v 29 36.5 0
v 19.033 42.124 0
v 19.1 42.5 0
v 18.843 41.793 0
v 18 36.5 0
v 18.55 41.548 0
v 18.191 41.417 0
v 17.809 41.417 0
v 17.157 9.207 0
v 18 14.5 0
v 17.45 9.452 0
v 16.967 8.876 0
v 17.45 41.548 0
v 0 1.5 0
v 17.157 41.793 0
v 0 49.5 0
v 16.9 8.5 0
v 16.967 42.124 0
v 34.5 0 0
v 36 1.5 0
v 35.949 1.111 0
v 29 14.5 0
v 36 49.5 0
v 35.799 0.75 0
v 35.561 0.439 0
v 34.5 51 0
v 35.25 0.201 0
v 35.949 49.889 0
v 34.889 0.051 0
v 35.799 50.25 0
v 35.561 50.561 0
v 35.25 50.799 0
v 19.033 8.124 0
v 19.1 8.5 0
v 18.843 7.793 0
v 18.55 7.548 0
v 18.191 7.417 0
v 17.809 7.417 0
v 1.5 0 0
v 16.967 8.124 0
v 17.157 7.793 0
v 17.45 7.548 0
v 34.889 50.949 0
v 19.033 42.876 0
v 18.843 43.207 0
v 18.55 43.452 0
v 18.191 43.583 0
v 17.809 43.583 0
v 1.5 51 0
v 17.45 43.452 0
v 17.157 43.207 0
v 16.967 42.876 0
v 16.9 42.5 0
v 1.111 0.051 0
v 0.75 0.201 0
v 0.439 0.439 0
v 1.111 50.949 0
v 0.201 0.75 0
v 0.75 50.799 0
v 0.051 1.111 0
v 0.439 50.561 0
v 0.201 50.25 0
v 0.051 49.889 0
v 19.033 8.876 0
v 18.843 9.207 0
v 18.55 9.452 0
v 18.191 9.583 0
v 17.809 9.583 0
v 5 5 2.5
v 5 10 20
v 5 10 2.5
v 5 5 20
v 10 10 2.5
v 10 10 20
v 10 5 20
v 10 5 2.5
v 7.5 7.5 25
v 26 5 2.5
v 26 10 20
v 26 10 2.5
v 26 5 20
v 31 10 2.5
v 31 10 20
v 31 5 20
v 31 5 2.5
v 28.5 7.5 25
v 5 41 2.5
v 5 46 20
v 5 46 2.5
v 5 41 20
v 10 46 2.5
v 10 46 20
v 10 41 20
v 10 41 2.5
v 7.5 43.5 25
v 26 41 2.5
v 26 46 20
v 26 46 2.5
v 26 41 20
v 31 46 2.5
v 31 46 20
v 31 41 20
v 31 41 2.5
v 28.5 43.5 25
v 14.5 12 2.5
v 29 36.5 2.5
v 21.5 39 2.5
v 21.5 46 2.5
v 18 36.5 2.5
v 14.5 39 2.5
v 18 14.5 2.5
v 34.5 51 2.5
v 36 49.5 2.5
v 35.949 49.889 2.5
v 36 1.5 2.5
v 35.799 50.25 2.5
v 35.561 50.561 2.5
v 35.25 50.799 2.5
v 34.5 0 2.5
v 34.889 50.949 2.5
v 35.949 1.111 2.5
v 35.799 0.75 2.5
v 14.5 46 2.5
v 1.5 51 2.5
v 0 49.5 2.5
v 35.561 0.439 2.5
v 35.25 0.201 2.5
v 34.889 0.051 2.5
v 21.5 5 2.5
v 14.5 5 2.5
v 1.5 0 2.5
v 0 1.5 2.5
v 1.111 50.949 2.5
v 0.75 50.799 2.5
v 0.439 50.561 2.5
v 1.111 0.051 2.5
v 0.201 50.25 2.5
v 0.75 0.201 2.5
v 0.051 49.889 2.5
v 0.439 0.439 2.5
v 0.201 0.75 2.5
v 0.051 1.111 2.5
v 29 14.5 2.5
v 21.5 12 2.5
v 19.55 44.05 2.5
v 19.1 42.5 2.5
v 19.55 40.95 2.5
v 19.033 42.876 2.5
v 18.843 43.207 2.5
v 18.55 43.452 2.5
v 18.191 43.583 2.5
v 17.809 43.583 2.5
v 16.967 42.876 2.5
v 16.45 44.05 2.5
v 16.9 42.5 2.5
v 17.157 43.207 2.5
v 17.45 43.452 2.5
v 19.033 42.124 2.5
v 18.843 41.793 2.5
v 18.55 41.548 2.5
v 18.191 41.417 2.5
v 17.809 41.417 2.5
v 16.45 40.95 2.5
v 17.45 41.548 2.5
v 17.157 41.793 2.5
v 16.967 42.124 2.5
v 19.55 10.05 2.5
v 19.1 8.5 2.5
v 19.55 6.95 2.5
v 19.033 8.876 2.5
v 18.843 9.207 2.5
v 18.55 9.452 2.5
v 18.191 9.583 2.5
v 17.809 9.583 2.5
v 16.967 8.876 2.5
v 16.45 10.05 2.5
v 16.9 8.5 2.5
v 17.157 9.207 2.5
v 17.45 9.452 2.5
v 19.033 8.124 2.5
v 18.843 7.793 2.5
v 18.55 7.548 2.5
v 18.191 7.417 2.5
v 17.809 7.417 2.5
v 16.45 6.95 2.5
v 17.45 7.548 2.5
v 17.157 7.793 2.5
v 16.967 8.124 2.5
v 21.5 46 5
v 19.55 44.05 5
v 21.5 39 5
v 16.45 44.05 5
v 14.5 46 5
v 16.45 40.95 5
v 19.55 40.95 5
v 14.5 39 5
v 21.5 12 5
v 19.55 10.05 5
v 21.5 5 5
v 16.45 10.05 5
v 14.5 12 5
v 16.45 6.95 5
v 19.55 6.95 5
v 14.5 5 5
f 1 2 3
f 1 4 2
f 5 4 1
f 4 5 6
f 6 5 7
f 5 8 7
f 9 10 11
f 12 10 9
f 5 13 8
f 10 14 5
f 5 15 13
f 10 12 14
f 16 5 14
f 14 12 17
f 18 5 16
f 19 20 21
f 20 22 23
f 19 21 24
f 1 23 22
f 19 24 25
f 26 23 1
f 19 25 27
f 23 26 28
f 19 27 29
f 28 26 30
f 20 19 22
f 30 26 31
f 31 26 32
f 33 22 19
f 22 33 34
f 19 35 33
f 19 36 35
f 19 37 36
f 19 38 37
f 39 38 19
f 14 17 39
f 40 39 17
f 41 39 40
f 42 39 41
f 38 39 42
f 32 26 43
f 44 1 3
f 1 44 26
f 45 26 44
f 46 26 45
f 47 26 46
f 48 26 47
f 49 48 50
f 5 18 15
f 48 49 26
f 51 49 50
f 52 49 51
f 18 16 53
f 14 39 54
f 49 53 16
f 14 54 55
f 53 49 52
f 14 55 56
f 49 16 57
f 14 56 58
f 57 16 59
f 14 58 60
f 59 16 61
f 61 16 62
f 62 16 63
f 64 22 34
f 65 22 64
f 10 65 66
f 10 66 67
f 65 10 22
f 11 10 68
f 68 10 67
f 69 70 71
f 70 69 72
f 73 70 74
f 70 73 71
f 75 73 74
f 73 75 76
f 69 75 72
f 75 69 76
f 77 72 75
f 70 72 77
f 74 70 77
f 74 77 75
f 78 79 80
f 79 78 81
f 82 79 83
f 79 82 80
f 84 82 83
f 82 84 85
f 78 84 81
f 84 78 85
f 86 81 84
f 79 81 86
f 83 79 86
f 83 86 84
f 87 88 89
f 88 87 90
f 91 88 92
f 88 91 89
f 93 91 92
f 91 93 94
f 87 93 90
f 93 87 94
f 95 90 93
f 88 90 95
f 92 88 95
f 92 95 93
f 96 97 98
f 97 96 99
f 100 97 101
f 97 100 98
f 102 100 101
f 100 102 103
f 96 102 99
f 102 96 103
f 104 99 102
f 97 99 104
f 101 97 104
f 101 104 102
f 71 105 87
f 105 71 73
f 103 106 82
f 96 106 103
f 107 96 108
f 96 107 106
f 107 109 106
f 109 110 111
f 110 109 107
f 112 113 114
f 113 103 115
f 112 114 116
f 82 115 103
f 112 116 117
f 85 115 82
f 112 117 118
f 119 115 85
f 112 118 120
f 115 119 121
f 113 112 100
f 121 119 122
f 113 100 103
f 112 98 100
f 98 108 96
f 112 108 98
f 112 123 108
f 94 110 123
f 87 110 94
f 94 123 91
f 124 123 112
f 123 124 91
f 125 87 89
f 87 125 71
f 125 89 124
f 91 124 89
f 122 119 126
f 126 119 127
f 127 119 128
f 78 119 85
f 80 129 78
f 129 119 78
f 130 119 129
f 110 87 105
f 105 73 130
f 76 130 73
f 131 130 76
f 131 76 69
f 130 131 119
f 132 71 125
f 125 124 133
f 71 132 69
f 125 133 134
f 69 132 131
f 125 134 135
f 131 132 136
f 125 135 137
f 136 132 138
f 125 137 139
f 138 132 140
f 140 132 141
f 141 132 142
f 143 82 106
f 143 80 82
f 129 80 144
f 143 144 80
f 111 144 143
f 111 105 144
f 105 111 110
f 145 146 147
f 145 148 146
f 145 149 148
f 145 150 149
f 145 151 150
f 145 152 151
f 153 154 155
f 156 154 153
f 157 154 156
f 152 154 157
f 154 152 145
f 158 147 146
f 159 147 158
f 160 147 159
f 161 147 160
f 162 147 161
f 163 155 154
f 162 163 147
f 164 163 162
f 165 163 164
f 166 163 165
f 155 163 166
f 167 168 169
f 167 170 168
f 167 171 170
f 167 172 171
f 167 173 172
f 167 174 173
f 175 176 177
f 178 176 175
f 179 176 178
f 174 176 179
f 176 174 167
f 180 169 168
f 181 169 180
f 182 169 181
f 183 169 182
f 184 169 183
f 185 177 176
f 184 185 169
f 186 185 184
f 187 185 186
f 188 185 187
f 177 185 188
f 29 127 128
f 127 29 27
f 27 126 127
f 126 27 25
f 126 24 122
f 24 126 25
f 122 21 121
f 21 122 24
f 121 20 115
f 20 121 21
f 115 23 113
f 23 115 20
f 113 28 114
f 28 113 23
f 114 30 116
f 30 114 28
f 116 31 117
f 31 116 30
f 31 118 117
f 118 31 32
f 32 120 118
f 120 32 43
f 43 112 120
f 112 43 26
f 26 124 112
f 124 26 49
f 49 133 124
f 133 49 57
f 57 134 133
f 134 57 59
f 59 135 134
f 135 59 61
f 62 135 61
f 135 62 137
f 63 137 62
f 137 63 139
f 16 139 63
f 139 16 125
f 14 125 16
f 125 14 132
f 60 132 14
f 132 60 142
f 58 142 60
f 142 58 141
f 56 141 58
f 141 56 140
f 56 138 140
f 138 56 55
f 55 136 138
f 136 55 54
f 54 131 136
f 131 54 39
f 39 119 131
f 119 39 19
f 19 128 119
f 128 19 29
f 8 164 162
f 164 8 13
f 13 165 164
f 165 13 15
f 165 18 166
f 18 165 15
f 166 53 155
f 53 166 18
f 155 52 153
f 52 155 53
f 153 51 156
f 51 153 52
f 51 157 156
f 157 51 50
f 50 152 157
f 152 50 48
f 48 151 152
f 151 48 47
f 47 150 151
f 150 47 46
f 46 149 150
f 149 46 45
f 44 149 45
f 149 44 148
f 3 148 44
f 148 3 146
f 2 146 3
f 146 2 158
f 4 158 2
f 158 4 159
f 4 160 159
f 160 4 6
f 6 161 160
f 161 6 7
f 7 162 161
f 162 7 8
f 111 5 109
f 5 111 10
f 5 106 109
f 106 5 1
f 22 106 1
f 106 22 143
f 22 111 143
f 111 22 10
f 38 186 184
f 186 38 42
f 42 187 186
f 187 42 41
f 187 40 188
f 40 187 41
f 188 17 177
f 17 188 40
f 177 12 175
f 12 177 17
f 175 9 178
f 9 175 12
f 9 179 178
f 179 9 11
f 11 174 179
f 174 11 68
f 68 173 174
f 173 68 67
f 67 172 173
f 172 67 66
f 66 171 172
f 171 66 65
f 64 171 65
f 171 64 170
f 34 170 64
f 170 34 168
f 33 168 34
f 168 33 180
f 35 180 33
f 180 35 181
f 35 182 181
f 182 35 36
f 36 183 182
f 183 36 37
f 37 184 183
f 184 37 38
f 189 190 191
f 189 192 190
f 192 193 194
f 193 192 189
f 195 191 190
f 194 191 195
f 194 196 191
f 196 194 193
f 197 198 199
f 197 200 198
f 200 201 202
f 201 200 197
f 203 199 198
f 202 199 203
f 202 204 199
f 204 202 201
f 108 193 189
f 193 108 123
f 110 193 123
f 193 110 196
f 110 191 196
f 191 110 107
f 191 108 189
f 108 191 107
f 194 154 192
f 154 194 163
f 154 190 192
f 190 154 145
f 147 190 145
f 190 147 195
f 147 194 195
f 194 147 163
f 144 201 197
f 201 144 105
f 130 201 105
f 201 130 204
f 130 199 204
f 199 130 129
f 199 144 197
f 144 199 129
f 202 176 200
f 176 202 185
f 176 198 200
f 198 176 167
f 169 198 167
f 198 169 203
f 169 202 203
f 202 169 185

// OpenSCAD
// file: thumb.scad
include <../library/config.scad>;
use <../library/lib.scad>;
legDepth = 20;
legThickness = 5;
legOffset = 5;
thumbClusterWidth = 51;
thumbClusterHeight = 36;

module thumb_clay_leg()
{
    union()
    {
        push(legDepth) square(legThickness, center = true);
        translate([ 0, 0, legDepth ]) linear_extrude(height = legThickness, scale = -10)
            square(legThickness, center = true);
    }
}
module thumb()
{
    union()
    {
        push(caseThikness) difference()
        {
            thumb_dxf();
            thumb_screw_holes_dxf();
        }
        push(caseThikness + screwBumpSize) thumb_screw_dxf();
        translate([ legOffset + legThickness / 2, legOffset + legThickness / 2, 0 ]) thumb_clay_leg();
        translate([ thumbClusterHeight - legOffset - legThickness / 2, legOffset + legThickness / 2, 0 ])
            thumb_clay_leg();

        translate([ legOffset + legThickness / 2, thumbClusterWidth - legOffset - legThickness / 2, 0 ])
            thumb_clay_leg();
        translate(
            [ thumbClusterHeight - legOffset - legThickness / 2, thumbClusterWidth - legOffset - legThickness / 2, 0 ])
            thumb_clay_leg();
    }
}
// file: ../library/lib.scad
include <./config.scad>;

// This function is limited to 11 elements!
function unshift(vec) = [ vec[1], vec[2], vec[3], vec[4], vec[5], vec[6], vec[7], vec[8], vec[9], vec[10], vec[11] ];

module showVector(vector)
// showVector(vector = [ 10, 10, 10 ]);
{
    start = [ 0, 0, 0 ];           // Starting point of the vector
    length = norm(vector - start); // Length of the vector
    x = vector[0];
    y = vector[1];
    z = vector[2];
    b = acos(z / length); // inclination angle
    c = atan2(y, x);      // azimuthal angle

    rotate([ 0, b, c ]) cylinder(h = length, r = 0.2);
    // % cube(vector); // corner of cube should coinciqde with end of cylin
}
// This function is limited to 11 elements!
function unshift(vec) = [ vec[1], vec[2], vec[3], vec[4], vec[5], vec[6], vec[7], vec[8], vec[9], vec[10], vec[11] ];

module showVector(vector)
// showVector(vector = [ 10, 10, 10 ]);
{
    start = [ 0, 0, 0 ];           // Starting point of the vector
    length = norm(vector - start); // Length of the vector
    x = vector[0];
    y = vector[1];
    z = vector[2];
    b = acos(z / length); // inclination angle
    c = atan2(y, x);      // azimuthal angle

    rotate([ 0, b, c ]) cylinder(h = length, r = 0.2);
    // % cube(vector); // corner of cube should coinciqde with end of cylin
}

// Allows to rotate a vector around the x, y and z axis while keeping original object rotation axis
// very usefull to rotate something around certain point in human readable format
// normal rotate() module stops being sane after second rotation
// i.e. rotate() rotate() rotate() will yield unexpected results if you are rotating for non 90 degree angles

module gimbalRotate(vector)
{
    x = vector[0];
    y = vector[1];
    z = vector[2];
    xVector = [ 1, 0, 0 ];
    yVector = [ 0, cos(x), sin(x) ];
    zVector = [ sin(y), -sin(x) * cos(y), cos(x) * cos(y) ];
    rotate(a = z, v = zVector) rotate(a = y, v = yVector) rotate(a = x, v = xVector) children(0);
}

// Same like linear_extrude but with negative parameters,
// and allows to extrude in both directions if you provide two parameters
module push(x, y)
{
    if (y == undef)
    {
        if (x > 0)
        {
            linear_extrude(x) children(0);
        }
        else
        {
            translate([ 0, 0, x ]) linear_extrude(x * -1) children(0);
        }
    }
    else
    {
        if (x > 0 && y > 0)
        {
            translate([ 0, 0, -y ]) linear_extrude(height = x + y) children(0);
        }
    }
}

// Utility module used to create shapes by cutting planes form them
// we can not cut a plane, but we can cut a sufficiently big cube, which is the same
module cut(size)
{

    if (size > 0)
    {
        push(size) square([ size, size ], center = true);
    }
    else
    {
        push(size) square([ -size, -size ], center = true);
    }
}

// given array of planes cut child nodes
module cut3d(planes)
{

    intersection()
    {
        children(0);
        intersection_for(i = planes)
        {

            moveRotateTranslate(i) cut(cutter);
        }
    }
}

// Utility module used to create walls
// usfull to create boxes
module wall(thikness, size)
{
    intersection()
    {
        cut(size);
        translate([ 0, 0, thikness ]) cut(-size);
    }
}

// Debug module to show the wall anchor
module showWall()
{
    union()
    {
        translate([ 0, 0, 15 ]) cube([ 1, 1, 30 ], center = true);
        sphere(r = 5);
    }
}

// Utility module to translate and rotate an object by a vector containing the translation and rotation values
// Limited to 11 elements
module moveRotateTranslate(rt)
{
    assert(len(rt) < 12, "rotation translation vector can not have more than 11 elements");
    if (rt[0] == undef)
    {
        children(0);
    }
    if (rt[0][0] == undef)
    {
        children(0);
    }
    else
    {
        if (rt[1] == undef)
        {
            if (rt[0][0] == "r")
            {
                rotate(rt[0][1]) children(0);
            }
            if (rt[0][0] == "t")
            {
                translate(rt[0][1]) children(0);
            }
        }
        else
        {
            if (rt[0][0] == "r")
            {
                rotate(rt[0][1]) moveRotateTranslate(unshift(rt)) children(0);
            }
            if (rt[0][0] == "t")
            {
                translate(rt[0][1]) moveRotateTranslate(unshift(rt)) children(0);
            }
        }
    }
}

// see box.scad for usage and debug examples
module box(walls, cutters, thikness, cutter)
{
    cut3d(cutters) union()
    {
        for (i = walls)
        {
            moveRotateTranslate(i) wall(thikness, cutter);
        }
    }
}

// if you have .dxf file and want to find its anchor point that is very uesfull
//  find_anchor([ 90, 0, 0 ]) import("path/to/file.dxf");
//  try rotating around x, y and z axis by 90 and 180 to find the anchor point
module find_anchor(v)
{
    children(0);
    color("yellow") rotate(v) children(0);
}

module anchor_thumb()
{
    translate([ thumbXOffset, thumbYOffset, thumbZOffset ])
        gimbalRotate([ thumbXRotation, thumbYRotation, thumbZRotation ]) rotate([ 0, 90, -90 ]) children(0);
}
module anchor_pcb()
{
    rotate([ 0, -tentingAngle, 0 ]) children(0);
}
module table()
{
    color("brown") translate([ -50, 0, -tableThikness ]) linear_extrude(tableThikness) square([ 300, 250 ]);
}

// LEFT
module left_pcb_dxf()
{
    // bottom left corner
    translate([ 7, 8.5, 0 ]) import("../../production/pcbs/left/left_pcb_edgecut.dxf");
}
module left_keycaps_dxf()
{
    // bottom left corner
    translate([ 7, 8.5, 0 ]) import("../../production/pcbs/left/left_keycaps.dxf");
}
module left_pcb_with_keys_dxf()
{
    // bottom left corner
    translate([ 7, 8.5, 0 ]) import("../../production/pcbs/left/left_pcb_edgecut_with_keys.dxf");
}
module left_switch_cutouts_dxf()
{
    // bottom left corner
    translate([ 7, 8.5, 0 ]) import("../../production/pcbs/left/left_switch_cutouts.dxf");
}
module left_screw_dxf()
{
    // bottom left corner
    translate([ 7, 8.5, 0 ]) import("../../production/pcbs/left/left_screw.dxf");
}
module left_screw_holes_dxf()
{
    // bottom left corner
    translate([ 7, 8.5, 0 ]) import("../../production/pcbs/left/left_screw_holes.dxf");
}
module left_pcb()
{
    color(pcbColor) linear_extrude(pcbAndHotswapThikness) left_pcb_dxf();
}

// THUMB

module thumb_dxf()
{
    // bottom left corner
    translate([ 9, 8.5, 0 ]) import("../../production/pcbs/thumb/thumb_pcb_edgecut.dxf");
}
module thumb_switch_cutouts_dxf()
{
    // bottom left corner
    translate([ 9, 8.5, 0 ]) import("../../production/pcbs/thumb/thumb_switch_cutouts.dxf");
}
module thumb_screw_dxf()
{
    // bottom left corner
    translate([ 9, 8.5, 0 ]) import("../../production/pcbs/thumb/thumb_screw.dxf");
}
module thumb_screw_holes_dxf()
{
    // bottom left corner
    translate([ 9, 8.5, 0 ]) import("../../production/pcbs/thumb/thumb_screw_holes.dxf");
}
module thumb_pcb()
{
    color("lightgreen") linear_extrude(pcbAndHotswapThikness) thumb_dxf();
}

module left_keys()
{
    translate([ 0, 0, pcbAndHotswapThikness ]) color(keysColor) linear_extrude(keysThikness) left_keycaps_dxf();
}
module left_case()
{
    color("grey") translate([ 0, 0, -caseThikness ]) push(caseThikness) left_case_dxf();
}

module thumb_keys()
{
    translate([ 0, 0, pcbAndHotswapThikness ]) color(keysColor) linear_extrude(keysThikness) thumb_dxf();
}

// NNANO
module nice_nano_mount_to_pcb()
{
    // translate for the pcb anchor
    translate([ 86.6, 29, 0 ]) rotate([ 180, 0, 90 ]) children(0);
}
module nice_nano()
{
    color("lightblue")
        // set anchor to bottom outermost corner hole of the pcb
        translate([ 15.24, -7.62, 6.3 ]) color(pcbColor) import("../shared-3d-models/nice-nano.stl");
}
// file: ../library/config.scad
pcbAndHotswapThikness = 3;
caseThikness = 2.5;
wallOffsetFromPcb = 1;
wallOffsetFromConnector = 3;
tentingAngle = 60;
tableThikness = 10;
keysThikness = 11;
caseColor = "grey";
pcbColor = "darkgreen";
keysColor = "white";
screwBumpSize = 2.5;
thumbXOffset = 49;
thumbYOffset = 28;
thumbZOffset = 71;
thumbXRotation = -20;
thumbYRotation = 35;
thumbZRotation = -10;
niceNanoCutoutDepth = 8;
switchCutout = 13.8;
switchCutoutDepth = 2.2;
extensionWidth = 60 + (caseThikness + wallOffsetFromPcb) * 2;
extensionLength = 90;
extensionShift = 11 - caseThikness - wallOffsetFromPcb;
pcbWidth = 90;
cutter = 400;
ccFarWall = 120;

ccFrontWall = 5 + caseThikness;
ccBackWall = 58 + ccFrontWall + caseThikness;

magnetStripeWidth = 26;
magnetStripeDepth = 0.7;
// legs
legRubberDepth = 1;
legRubberDiameter = 8;
legsInsideDepth = caseThikness;
legs = [
    [ 5, 69 - legRubberDiameter / 2 - caseThikness ], [ 5, 13 ],
    [ ccFarWall - legRubberDiameter / 2 - caseThikness, 13 ],
    [ ccFarWall - legRubberDiameter / 2 - caseThikness, 69 - legRubberDiameter / 2 - caseThikness ]
];

// case to case mounting
screwHoleDiameter = 2.3;
// main file
include <../library/config.scad>;
use <../library/lib.scad>;
use <./thumb.scad>;
$fa = 1;
$fs = 0.4;
thumb();
